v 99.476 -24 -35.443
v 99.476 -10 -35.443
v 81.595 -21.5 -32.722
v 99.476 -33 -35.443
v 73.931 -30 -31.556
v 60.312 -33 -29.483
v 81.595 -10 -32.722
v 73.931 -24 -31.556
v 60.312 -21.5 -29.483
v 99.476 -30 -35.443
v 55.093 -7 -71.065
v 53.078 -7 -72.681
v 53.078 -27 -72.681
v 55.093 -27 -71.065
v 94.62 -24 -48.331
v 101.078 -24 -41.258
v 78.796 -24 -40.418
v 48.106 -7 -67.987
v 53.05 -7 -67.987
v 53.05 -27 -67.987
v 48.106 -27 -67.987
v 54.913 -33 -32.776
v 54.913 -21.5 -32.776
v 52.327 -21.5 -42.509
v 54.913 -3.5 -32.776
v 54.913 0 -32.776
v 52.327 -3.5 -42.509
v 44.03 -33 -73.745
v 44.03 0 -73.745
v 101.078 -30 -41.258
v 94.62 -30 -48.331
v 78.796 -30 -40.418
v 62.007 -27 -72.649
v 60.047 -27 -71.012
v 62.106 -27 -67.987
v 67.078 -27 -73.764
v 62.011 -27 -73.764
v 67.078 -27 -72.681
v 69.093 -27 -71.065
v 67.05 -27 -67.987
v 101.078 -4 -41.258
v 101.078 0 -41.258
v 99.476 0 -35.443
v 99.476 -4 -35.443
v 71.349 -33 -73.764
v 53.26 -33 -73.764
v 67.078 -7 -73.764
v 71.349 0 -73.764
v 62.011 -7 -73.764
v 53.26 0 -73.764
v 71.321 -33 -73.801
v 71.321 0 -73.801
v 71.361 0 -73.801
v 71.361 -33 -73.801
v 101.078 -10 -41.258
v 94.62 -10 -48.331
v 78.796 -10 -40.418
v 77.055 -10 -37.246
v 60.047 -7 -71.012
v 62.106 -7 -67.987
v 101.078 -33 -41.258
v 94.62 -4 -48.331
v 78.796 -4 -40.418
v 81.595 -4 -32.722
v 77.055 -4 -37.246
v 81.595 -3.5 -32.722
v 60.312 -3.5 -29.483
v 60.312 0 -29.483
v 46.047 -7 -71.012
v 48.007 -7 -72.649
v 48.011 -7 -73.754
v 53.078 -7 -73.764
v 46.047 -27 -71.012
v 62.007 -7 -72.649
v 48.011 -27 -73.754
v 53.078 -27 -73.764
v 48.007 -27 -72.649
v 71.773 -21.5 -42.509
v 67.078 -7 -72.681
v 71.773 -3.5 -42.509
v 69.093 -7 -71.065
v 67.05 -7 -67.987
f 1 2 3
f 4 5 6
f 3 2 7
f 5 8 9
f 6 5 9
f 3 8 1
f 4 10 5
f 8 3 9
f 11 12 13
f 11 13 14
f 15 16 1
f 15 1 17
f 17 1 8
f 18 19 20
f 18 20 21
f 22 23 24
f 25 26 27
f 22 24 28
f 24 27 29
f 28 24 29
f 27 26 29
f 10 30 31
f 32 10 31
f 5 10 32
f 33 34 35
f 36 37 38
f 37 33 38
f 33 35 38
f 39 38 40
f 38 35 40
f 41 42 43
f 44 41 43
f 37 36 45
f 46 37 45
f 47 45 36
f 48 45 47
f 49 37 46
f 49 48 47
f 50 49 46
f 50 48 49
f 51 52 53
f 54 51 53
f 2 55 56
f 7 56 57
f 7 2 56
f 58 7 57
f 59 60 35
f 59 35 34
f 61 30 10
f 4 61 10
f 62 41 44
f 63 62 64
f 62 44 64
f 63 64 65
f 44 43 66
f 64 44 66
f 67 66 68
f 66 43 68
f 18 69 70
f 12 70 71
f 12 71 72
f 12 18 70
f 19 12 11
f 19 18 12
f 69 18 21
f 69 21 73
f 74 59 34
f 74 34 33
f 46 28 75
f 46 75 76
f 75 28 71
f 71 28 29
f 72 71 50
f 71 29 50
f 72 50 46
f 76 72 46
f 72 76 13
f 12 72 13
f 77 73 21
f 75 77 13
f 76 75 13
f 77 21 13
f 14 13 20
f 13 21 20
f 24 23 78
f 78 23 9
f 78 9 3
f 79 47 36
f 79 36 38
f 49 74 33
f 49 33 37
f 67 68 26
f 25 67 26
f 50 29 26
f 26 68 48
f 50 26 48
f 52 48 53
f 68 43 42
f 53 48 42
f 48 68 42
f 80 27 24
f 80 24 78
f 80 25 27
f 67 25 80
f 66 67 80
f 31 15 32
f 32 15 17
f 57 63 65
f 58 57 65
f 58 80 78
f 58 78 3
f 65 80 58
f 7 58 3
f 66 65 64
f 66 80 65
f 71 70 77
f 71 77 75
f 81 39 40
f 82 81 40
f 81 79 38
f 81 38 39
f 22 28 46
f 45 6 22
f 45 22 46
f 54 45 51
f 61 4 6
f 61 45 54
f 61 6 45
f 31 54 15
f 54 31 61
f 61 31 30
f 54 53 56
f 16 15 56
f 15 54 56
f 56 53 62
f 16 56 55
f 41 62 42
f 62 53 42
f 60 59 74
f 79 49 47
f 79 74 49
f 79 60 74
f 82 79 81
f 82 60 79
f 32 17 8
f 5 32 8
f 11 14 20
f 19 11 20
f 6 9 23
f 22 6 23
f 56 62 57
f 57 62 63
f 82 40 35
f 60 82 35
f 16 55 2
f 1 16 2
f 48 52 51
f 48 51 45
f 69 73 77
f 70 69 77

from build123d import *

# Parameters (mm, degrees)
PAD049_DEPTH = 6
PAD050_DEPTH = 6
PAD051_DEPTH = 18
PAD043_DEPTH = 20
PAD041_DEPTH = 33
PAD042_DEPTH = 20
PAD040_DEPTH = 33


with BuildPart() as pad049:
    # Sketch053 → Pad049 (new body)
    with BuildSketch(Plane.XZ.offset(4)):
        Polygon((-22.876627, -50.458862), (-2.795745, -40.418423), (3.522805, -28.90654), (-39.408733, -32.801537), align=None)
    extrude(amount=PAD049_DEPTH)


with BuildPart() as pad050:
    # Sketch054 → Pad050 (new body)
    with BuildSketch(Plane.XZ.offset(24)):
        Polygon((-22.876627, -50.458862), (-2.795745, -40.418423), (3.522805, -28.90654), (-39.408733, -32.801537), align=None)
    extrude(amount=PAD050_DEPTH)


with BuildPart() as pad051:
    # Sketch055 → Pad051 (new body)
    with BuildSketch(Plane.XZ.offset(3.5)):
        Polygon((26.854265, -42.508881), (4.226509, -42.508881), (-12.077076, -26.263317), (32.65625, -19.126871), align=None)
    extrude(amount=PAD051_DEPTH)


with BuildPart() as pad043:
    # Sketch047 → Pad043 (new body)
    with BuildSketch(Plane(origin=(10, -7, 0), x_dir=(1, 0, 0), z_dir=(0, -1, 0))):
        Polygon((12.921668, -76.043343), (12.921668, -72.681298), (10.907037, -71.064545), (12.949577, -67.987406), (17.894252, -67.987406), (19.953335, -71.012405), (17.993304, -72.648705), (17.981073, -76.043343), align=None)
    extrude(amount=PAD043_DEPTH)


with BuildPart() as pad041:
    # Sketch045 → Pad041 (new body)
    with BuildSketch(Plane.XZ):
        Polygon((31.922119, -73.764191), (34.715668, -84.347412), (31.00419, -84.347412), (29.994871, -83.010223), (29.004835, -82.997353), (29.97435, -84.356453), (27.001257, -84.356453), (25.99424, -83.013763), (24.977634, -83.013763), (26.003832, -84.375633), (23.007538, -84.375633), (22.019703, -83.023636), (20.974325, -83.023636), (22.000523, -84.366325), (19.017838, -84.366325), (17.99164, -83.004456), (16.984625, -83.004456), (18.00123, -84.366325), (15.032244, -84.366325), (14.013124, -83.020378), (12.982291, -83.020378), (14.00141, -84.379204), (12.681671, -84.379204), (4.650895, -73.764191), align=None)
    extrude(amount=PAD041_DEPTH)


with BuildPart() as fusion011:
    # Sketch046 → Pad042 (new body)
    with BuildSketch(Plane(origin=(-4, -7, 0), x_dir=(1, 0, 0), z_dir=(0, -1, 0))):
        Polygon((12.921668, -76.043343), (12.921668, -72.681298), (10.907037, -71.064545), (12.949577, -67.987406), (17.894252, -67.987406), (19.953335, -71.012405), (17.993304, -72.648705), (17.981073, -76.043343), align=None)
    extrude(amount=PAD042_DEPTH)

    # Fusion010: union Pad041
    add(pad041.part)

    # Fusion011: union Pad043
    add(pad043.part)


with BuildPart() as cut018:
    # Sketch043 → Pad040 (new body)
    with BuildSketch(Plane(origin=(-15, 0, -10), x_dir=(0.819152, 0, 0.573576), z_dir=(0, -1, 0))):
        Polygon((-26.184557, -19.824878), (-21.536683, -15.979609), (13.963177, -33.561758), (16.497322, -39.355457), (1.912507, -79.157962), (-20.506964, -63.527428), align=None)
    extrude(amount=PAD040_DEPTH)

    # Cut010: cut Fusion011
    add(fusion011.part, mode=Mode.SUBTRACT)

    # Cut016: cut Pad051
    add(pad051.part, mode=Mode.SUBTRACT)

    # Cut017: cut Pad050
    add(pad050.part, mode=Mode.SUBTRACT)

    # Cut018: cut Pad049
    add(pad049.part, mode=Mode.SUBTRACT)


with BuildPart() as part_mirroring019:
    # Part__Mirroring019: instance of Cut018
    add(cut018.part.mirror(Plane(origin=(0, 0, 0), x_dir=(0, -1, 0), z_dir=(1, 0, 0))))


with BuildPart() as part_mirroring019_1:
    # Part__Mirroring019 placement: moved
    add(part_mirroring019.part.moved(Location((76, 0, 0))))


solid = part_mirroring019_1.part
